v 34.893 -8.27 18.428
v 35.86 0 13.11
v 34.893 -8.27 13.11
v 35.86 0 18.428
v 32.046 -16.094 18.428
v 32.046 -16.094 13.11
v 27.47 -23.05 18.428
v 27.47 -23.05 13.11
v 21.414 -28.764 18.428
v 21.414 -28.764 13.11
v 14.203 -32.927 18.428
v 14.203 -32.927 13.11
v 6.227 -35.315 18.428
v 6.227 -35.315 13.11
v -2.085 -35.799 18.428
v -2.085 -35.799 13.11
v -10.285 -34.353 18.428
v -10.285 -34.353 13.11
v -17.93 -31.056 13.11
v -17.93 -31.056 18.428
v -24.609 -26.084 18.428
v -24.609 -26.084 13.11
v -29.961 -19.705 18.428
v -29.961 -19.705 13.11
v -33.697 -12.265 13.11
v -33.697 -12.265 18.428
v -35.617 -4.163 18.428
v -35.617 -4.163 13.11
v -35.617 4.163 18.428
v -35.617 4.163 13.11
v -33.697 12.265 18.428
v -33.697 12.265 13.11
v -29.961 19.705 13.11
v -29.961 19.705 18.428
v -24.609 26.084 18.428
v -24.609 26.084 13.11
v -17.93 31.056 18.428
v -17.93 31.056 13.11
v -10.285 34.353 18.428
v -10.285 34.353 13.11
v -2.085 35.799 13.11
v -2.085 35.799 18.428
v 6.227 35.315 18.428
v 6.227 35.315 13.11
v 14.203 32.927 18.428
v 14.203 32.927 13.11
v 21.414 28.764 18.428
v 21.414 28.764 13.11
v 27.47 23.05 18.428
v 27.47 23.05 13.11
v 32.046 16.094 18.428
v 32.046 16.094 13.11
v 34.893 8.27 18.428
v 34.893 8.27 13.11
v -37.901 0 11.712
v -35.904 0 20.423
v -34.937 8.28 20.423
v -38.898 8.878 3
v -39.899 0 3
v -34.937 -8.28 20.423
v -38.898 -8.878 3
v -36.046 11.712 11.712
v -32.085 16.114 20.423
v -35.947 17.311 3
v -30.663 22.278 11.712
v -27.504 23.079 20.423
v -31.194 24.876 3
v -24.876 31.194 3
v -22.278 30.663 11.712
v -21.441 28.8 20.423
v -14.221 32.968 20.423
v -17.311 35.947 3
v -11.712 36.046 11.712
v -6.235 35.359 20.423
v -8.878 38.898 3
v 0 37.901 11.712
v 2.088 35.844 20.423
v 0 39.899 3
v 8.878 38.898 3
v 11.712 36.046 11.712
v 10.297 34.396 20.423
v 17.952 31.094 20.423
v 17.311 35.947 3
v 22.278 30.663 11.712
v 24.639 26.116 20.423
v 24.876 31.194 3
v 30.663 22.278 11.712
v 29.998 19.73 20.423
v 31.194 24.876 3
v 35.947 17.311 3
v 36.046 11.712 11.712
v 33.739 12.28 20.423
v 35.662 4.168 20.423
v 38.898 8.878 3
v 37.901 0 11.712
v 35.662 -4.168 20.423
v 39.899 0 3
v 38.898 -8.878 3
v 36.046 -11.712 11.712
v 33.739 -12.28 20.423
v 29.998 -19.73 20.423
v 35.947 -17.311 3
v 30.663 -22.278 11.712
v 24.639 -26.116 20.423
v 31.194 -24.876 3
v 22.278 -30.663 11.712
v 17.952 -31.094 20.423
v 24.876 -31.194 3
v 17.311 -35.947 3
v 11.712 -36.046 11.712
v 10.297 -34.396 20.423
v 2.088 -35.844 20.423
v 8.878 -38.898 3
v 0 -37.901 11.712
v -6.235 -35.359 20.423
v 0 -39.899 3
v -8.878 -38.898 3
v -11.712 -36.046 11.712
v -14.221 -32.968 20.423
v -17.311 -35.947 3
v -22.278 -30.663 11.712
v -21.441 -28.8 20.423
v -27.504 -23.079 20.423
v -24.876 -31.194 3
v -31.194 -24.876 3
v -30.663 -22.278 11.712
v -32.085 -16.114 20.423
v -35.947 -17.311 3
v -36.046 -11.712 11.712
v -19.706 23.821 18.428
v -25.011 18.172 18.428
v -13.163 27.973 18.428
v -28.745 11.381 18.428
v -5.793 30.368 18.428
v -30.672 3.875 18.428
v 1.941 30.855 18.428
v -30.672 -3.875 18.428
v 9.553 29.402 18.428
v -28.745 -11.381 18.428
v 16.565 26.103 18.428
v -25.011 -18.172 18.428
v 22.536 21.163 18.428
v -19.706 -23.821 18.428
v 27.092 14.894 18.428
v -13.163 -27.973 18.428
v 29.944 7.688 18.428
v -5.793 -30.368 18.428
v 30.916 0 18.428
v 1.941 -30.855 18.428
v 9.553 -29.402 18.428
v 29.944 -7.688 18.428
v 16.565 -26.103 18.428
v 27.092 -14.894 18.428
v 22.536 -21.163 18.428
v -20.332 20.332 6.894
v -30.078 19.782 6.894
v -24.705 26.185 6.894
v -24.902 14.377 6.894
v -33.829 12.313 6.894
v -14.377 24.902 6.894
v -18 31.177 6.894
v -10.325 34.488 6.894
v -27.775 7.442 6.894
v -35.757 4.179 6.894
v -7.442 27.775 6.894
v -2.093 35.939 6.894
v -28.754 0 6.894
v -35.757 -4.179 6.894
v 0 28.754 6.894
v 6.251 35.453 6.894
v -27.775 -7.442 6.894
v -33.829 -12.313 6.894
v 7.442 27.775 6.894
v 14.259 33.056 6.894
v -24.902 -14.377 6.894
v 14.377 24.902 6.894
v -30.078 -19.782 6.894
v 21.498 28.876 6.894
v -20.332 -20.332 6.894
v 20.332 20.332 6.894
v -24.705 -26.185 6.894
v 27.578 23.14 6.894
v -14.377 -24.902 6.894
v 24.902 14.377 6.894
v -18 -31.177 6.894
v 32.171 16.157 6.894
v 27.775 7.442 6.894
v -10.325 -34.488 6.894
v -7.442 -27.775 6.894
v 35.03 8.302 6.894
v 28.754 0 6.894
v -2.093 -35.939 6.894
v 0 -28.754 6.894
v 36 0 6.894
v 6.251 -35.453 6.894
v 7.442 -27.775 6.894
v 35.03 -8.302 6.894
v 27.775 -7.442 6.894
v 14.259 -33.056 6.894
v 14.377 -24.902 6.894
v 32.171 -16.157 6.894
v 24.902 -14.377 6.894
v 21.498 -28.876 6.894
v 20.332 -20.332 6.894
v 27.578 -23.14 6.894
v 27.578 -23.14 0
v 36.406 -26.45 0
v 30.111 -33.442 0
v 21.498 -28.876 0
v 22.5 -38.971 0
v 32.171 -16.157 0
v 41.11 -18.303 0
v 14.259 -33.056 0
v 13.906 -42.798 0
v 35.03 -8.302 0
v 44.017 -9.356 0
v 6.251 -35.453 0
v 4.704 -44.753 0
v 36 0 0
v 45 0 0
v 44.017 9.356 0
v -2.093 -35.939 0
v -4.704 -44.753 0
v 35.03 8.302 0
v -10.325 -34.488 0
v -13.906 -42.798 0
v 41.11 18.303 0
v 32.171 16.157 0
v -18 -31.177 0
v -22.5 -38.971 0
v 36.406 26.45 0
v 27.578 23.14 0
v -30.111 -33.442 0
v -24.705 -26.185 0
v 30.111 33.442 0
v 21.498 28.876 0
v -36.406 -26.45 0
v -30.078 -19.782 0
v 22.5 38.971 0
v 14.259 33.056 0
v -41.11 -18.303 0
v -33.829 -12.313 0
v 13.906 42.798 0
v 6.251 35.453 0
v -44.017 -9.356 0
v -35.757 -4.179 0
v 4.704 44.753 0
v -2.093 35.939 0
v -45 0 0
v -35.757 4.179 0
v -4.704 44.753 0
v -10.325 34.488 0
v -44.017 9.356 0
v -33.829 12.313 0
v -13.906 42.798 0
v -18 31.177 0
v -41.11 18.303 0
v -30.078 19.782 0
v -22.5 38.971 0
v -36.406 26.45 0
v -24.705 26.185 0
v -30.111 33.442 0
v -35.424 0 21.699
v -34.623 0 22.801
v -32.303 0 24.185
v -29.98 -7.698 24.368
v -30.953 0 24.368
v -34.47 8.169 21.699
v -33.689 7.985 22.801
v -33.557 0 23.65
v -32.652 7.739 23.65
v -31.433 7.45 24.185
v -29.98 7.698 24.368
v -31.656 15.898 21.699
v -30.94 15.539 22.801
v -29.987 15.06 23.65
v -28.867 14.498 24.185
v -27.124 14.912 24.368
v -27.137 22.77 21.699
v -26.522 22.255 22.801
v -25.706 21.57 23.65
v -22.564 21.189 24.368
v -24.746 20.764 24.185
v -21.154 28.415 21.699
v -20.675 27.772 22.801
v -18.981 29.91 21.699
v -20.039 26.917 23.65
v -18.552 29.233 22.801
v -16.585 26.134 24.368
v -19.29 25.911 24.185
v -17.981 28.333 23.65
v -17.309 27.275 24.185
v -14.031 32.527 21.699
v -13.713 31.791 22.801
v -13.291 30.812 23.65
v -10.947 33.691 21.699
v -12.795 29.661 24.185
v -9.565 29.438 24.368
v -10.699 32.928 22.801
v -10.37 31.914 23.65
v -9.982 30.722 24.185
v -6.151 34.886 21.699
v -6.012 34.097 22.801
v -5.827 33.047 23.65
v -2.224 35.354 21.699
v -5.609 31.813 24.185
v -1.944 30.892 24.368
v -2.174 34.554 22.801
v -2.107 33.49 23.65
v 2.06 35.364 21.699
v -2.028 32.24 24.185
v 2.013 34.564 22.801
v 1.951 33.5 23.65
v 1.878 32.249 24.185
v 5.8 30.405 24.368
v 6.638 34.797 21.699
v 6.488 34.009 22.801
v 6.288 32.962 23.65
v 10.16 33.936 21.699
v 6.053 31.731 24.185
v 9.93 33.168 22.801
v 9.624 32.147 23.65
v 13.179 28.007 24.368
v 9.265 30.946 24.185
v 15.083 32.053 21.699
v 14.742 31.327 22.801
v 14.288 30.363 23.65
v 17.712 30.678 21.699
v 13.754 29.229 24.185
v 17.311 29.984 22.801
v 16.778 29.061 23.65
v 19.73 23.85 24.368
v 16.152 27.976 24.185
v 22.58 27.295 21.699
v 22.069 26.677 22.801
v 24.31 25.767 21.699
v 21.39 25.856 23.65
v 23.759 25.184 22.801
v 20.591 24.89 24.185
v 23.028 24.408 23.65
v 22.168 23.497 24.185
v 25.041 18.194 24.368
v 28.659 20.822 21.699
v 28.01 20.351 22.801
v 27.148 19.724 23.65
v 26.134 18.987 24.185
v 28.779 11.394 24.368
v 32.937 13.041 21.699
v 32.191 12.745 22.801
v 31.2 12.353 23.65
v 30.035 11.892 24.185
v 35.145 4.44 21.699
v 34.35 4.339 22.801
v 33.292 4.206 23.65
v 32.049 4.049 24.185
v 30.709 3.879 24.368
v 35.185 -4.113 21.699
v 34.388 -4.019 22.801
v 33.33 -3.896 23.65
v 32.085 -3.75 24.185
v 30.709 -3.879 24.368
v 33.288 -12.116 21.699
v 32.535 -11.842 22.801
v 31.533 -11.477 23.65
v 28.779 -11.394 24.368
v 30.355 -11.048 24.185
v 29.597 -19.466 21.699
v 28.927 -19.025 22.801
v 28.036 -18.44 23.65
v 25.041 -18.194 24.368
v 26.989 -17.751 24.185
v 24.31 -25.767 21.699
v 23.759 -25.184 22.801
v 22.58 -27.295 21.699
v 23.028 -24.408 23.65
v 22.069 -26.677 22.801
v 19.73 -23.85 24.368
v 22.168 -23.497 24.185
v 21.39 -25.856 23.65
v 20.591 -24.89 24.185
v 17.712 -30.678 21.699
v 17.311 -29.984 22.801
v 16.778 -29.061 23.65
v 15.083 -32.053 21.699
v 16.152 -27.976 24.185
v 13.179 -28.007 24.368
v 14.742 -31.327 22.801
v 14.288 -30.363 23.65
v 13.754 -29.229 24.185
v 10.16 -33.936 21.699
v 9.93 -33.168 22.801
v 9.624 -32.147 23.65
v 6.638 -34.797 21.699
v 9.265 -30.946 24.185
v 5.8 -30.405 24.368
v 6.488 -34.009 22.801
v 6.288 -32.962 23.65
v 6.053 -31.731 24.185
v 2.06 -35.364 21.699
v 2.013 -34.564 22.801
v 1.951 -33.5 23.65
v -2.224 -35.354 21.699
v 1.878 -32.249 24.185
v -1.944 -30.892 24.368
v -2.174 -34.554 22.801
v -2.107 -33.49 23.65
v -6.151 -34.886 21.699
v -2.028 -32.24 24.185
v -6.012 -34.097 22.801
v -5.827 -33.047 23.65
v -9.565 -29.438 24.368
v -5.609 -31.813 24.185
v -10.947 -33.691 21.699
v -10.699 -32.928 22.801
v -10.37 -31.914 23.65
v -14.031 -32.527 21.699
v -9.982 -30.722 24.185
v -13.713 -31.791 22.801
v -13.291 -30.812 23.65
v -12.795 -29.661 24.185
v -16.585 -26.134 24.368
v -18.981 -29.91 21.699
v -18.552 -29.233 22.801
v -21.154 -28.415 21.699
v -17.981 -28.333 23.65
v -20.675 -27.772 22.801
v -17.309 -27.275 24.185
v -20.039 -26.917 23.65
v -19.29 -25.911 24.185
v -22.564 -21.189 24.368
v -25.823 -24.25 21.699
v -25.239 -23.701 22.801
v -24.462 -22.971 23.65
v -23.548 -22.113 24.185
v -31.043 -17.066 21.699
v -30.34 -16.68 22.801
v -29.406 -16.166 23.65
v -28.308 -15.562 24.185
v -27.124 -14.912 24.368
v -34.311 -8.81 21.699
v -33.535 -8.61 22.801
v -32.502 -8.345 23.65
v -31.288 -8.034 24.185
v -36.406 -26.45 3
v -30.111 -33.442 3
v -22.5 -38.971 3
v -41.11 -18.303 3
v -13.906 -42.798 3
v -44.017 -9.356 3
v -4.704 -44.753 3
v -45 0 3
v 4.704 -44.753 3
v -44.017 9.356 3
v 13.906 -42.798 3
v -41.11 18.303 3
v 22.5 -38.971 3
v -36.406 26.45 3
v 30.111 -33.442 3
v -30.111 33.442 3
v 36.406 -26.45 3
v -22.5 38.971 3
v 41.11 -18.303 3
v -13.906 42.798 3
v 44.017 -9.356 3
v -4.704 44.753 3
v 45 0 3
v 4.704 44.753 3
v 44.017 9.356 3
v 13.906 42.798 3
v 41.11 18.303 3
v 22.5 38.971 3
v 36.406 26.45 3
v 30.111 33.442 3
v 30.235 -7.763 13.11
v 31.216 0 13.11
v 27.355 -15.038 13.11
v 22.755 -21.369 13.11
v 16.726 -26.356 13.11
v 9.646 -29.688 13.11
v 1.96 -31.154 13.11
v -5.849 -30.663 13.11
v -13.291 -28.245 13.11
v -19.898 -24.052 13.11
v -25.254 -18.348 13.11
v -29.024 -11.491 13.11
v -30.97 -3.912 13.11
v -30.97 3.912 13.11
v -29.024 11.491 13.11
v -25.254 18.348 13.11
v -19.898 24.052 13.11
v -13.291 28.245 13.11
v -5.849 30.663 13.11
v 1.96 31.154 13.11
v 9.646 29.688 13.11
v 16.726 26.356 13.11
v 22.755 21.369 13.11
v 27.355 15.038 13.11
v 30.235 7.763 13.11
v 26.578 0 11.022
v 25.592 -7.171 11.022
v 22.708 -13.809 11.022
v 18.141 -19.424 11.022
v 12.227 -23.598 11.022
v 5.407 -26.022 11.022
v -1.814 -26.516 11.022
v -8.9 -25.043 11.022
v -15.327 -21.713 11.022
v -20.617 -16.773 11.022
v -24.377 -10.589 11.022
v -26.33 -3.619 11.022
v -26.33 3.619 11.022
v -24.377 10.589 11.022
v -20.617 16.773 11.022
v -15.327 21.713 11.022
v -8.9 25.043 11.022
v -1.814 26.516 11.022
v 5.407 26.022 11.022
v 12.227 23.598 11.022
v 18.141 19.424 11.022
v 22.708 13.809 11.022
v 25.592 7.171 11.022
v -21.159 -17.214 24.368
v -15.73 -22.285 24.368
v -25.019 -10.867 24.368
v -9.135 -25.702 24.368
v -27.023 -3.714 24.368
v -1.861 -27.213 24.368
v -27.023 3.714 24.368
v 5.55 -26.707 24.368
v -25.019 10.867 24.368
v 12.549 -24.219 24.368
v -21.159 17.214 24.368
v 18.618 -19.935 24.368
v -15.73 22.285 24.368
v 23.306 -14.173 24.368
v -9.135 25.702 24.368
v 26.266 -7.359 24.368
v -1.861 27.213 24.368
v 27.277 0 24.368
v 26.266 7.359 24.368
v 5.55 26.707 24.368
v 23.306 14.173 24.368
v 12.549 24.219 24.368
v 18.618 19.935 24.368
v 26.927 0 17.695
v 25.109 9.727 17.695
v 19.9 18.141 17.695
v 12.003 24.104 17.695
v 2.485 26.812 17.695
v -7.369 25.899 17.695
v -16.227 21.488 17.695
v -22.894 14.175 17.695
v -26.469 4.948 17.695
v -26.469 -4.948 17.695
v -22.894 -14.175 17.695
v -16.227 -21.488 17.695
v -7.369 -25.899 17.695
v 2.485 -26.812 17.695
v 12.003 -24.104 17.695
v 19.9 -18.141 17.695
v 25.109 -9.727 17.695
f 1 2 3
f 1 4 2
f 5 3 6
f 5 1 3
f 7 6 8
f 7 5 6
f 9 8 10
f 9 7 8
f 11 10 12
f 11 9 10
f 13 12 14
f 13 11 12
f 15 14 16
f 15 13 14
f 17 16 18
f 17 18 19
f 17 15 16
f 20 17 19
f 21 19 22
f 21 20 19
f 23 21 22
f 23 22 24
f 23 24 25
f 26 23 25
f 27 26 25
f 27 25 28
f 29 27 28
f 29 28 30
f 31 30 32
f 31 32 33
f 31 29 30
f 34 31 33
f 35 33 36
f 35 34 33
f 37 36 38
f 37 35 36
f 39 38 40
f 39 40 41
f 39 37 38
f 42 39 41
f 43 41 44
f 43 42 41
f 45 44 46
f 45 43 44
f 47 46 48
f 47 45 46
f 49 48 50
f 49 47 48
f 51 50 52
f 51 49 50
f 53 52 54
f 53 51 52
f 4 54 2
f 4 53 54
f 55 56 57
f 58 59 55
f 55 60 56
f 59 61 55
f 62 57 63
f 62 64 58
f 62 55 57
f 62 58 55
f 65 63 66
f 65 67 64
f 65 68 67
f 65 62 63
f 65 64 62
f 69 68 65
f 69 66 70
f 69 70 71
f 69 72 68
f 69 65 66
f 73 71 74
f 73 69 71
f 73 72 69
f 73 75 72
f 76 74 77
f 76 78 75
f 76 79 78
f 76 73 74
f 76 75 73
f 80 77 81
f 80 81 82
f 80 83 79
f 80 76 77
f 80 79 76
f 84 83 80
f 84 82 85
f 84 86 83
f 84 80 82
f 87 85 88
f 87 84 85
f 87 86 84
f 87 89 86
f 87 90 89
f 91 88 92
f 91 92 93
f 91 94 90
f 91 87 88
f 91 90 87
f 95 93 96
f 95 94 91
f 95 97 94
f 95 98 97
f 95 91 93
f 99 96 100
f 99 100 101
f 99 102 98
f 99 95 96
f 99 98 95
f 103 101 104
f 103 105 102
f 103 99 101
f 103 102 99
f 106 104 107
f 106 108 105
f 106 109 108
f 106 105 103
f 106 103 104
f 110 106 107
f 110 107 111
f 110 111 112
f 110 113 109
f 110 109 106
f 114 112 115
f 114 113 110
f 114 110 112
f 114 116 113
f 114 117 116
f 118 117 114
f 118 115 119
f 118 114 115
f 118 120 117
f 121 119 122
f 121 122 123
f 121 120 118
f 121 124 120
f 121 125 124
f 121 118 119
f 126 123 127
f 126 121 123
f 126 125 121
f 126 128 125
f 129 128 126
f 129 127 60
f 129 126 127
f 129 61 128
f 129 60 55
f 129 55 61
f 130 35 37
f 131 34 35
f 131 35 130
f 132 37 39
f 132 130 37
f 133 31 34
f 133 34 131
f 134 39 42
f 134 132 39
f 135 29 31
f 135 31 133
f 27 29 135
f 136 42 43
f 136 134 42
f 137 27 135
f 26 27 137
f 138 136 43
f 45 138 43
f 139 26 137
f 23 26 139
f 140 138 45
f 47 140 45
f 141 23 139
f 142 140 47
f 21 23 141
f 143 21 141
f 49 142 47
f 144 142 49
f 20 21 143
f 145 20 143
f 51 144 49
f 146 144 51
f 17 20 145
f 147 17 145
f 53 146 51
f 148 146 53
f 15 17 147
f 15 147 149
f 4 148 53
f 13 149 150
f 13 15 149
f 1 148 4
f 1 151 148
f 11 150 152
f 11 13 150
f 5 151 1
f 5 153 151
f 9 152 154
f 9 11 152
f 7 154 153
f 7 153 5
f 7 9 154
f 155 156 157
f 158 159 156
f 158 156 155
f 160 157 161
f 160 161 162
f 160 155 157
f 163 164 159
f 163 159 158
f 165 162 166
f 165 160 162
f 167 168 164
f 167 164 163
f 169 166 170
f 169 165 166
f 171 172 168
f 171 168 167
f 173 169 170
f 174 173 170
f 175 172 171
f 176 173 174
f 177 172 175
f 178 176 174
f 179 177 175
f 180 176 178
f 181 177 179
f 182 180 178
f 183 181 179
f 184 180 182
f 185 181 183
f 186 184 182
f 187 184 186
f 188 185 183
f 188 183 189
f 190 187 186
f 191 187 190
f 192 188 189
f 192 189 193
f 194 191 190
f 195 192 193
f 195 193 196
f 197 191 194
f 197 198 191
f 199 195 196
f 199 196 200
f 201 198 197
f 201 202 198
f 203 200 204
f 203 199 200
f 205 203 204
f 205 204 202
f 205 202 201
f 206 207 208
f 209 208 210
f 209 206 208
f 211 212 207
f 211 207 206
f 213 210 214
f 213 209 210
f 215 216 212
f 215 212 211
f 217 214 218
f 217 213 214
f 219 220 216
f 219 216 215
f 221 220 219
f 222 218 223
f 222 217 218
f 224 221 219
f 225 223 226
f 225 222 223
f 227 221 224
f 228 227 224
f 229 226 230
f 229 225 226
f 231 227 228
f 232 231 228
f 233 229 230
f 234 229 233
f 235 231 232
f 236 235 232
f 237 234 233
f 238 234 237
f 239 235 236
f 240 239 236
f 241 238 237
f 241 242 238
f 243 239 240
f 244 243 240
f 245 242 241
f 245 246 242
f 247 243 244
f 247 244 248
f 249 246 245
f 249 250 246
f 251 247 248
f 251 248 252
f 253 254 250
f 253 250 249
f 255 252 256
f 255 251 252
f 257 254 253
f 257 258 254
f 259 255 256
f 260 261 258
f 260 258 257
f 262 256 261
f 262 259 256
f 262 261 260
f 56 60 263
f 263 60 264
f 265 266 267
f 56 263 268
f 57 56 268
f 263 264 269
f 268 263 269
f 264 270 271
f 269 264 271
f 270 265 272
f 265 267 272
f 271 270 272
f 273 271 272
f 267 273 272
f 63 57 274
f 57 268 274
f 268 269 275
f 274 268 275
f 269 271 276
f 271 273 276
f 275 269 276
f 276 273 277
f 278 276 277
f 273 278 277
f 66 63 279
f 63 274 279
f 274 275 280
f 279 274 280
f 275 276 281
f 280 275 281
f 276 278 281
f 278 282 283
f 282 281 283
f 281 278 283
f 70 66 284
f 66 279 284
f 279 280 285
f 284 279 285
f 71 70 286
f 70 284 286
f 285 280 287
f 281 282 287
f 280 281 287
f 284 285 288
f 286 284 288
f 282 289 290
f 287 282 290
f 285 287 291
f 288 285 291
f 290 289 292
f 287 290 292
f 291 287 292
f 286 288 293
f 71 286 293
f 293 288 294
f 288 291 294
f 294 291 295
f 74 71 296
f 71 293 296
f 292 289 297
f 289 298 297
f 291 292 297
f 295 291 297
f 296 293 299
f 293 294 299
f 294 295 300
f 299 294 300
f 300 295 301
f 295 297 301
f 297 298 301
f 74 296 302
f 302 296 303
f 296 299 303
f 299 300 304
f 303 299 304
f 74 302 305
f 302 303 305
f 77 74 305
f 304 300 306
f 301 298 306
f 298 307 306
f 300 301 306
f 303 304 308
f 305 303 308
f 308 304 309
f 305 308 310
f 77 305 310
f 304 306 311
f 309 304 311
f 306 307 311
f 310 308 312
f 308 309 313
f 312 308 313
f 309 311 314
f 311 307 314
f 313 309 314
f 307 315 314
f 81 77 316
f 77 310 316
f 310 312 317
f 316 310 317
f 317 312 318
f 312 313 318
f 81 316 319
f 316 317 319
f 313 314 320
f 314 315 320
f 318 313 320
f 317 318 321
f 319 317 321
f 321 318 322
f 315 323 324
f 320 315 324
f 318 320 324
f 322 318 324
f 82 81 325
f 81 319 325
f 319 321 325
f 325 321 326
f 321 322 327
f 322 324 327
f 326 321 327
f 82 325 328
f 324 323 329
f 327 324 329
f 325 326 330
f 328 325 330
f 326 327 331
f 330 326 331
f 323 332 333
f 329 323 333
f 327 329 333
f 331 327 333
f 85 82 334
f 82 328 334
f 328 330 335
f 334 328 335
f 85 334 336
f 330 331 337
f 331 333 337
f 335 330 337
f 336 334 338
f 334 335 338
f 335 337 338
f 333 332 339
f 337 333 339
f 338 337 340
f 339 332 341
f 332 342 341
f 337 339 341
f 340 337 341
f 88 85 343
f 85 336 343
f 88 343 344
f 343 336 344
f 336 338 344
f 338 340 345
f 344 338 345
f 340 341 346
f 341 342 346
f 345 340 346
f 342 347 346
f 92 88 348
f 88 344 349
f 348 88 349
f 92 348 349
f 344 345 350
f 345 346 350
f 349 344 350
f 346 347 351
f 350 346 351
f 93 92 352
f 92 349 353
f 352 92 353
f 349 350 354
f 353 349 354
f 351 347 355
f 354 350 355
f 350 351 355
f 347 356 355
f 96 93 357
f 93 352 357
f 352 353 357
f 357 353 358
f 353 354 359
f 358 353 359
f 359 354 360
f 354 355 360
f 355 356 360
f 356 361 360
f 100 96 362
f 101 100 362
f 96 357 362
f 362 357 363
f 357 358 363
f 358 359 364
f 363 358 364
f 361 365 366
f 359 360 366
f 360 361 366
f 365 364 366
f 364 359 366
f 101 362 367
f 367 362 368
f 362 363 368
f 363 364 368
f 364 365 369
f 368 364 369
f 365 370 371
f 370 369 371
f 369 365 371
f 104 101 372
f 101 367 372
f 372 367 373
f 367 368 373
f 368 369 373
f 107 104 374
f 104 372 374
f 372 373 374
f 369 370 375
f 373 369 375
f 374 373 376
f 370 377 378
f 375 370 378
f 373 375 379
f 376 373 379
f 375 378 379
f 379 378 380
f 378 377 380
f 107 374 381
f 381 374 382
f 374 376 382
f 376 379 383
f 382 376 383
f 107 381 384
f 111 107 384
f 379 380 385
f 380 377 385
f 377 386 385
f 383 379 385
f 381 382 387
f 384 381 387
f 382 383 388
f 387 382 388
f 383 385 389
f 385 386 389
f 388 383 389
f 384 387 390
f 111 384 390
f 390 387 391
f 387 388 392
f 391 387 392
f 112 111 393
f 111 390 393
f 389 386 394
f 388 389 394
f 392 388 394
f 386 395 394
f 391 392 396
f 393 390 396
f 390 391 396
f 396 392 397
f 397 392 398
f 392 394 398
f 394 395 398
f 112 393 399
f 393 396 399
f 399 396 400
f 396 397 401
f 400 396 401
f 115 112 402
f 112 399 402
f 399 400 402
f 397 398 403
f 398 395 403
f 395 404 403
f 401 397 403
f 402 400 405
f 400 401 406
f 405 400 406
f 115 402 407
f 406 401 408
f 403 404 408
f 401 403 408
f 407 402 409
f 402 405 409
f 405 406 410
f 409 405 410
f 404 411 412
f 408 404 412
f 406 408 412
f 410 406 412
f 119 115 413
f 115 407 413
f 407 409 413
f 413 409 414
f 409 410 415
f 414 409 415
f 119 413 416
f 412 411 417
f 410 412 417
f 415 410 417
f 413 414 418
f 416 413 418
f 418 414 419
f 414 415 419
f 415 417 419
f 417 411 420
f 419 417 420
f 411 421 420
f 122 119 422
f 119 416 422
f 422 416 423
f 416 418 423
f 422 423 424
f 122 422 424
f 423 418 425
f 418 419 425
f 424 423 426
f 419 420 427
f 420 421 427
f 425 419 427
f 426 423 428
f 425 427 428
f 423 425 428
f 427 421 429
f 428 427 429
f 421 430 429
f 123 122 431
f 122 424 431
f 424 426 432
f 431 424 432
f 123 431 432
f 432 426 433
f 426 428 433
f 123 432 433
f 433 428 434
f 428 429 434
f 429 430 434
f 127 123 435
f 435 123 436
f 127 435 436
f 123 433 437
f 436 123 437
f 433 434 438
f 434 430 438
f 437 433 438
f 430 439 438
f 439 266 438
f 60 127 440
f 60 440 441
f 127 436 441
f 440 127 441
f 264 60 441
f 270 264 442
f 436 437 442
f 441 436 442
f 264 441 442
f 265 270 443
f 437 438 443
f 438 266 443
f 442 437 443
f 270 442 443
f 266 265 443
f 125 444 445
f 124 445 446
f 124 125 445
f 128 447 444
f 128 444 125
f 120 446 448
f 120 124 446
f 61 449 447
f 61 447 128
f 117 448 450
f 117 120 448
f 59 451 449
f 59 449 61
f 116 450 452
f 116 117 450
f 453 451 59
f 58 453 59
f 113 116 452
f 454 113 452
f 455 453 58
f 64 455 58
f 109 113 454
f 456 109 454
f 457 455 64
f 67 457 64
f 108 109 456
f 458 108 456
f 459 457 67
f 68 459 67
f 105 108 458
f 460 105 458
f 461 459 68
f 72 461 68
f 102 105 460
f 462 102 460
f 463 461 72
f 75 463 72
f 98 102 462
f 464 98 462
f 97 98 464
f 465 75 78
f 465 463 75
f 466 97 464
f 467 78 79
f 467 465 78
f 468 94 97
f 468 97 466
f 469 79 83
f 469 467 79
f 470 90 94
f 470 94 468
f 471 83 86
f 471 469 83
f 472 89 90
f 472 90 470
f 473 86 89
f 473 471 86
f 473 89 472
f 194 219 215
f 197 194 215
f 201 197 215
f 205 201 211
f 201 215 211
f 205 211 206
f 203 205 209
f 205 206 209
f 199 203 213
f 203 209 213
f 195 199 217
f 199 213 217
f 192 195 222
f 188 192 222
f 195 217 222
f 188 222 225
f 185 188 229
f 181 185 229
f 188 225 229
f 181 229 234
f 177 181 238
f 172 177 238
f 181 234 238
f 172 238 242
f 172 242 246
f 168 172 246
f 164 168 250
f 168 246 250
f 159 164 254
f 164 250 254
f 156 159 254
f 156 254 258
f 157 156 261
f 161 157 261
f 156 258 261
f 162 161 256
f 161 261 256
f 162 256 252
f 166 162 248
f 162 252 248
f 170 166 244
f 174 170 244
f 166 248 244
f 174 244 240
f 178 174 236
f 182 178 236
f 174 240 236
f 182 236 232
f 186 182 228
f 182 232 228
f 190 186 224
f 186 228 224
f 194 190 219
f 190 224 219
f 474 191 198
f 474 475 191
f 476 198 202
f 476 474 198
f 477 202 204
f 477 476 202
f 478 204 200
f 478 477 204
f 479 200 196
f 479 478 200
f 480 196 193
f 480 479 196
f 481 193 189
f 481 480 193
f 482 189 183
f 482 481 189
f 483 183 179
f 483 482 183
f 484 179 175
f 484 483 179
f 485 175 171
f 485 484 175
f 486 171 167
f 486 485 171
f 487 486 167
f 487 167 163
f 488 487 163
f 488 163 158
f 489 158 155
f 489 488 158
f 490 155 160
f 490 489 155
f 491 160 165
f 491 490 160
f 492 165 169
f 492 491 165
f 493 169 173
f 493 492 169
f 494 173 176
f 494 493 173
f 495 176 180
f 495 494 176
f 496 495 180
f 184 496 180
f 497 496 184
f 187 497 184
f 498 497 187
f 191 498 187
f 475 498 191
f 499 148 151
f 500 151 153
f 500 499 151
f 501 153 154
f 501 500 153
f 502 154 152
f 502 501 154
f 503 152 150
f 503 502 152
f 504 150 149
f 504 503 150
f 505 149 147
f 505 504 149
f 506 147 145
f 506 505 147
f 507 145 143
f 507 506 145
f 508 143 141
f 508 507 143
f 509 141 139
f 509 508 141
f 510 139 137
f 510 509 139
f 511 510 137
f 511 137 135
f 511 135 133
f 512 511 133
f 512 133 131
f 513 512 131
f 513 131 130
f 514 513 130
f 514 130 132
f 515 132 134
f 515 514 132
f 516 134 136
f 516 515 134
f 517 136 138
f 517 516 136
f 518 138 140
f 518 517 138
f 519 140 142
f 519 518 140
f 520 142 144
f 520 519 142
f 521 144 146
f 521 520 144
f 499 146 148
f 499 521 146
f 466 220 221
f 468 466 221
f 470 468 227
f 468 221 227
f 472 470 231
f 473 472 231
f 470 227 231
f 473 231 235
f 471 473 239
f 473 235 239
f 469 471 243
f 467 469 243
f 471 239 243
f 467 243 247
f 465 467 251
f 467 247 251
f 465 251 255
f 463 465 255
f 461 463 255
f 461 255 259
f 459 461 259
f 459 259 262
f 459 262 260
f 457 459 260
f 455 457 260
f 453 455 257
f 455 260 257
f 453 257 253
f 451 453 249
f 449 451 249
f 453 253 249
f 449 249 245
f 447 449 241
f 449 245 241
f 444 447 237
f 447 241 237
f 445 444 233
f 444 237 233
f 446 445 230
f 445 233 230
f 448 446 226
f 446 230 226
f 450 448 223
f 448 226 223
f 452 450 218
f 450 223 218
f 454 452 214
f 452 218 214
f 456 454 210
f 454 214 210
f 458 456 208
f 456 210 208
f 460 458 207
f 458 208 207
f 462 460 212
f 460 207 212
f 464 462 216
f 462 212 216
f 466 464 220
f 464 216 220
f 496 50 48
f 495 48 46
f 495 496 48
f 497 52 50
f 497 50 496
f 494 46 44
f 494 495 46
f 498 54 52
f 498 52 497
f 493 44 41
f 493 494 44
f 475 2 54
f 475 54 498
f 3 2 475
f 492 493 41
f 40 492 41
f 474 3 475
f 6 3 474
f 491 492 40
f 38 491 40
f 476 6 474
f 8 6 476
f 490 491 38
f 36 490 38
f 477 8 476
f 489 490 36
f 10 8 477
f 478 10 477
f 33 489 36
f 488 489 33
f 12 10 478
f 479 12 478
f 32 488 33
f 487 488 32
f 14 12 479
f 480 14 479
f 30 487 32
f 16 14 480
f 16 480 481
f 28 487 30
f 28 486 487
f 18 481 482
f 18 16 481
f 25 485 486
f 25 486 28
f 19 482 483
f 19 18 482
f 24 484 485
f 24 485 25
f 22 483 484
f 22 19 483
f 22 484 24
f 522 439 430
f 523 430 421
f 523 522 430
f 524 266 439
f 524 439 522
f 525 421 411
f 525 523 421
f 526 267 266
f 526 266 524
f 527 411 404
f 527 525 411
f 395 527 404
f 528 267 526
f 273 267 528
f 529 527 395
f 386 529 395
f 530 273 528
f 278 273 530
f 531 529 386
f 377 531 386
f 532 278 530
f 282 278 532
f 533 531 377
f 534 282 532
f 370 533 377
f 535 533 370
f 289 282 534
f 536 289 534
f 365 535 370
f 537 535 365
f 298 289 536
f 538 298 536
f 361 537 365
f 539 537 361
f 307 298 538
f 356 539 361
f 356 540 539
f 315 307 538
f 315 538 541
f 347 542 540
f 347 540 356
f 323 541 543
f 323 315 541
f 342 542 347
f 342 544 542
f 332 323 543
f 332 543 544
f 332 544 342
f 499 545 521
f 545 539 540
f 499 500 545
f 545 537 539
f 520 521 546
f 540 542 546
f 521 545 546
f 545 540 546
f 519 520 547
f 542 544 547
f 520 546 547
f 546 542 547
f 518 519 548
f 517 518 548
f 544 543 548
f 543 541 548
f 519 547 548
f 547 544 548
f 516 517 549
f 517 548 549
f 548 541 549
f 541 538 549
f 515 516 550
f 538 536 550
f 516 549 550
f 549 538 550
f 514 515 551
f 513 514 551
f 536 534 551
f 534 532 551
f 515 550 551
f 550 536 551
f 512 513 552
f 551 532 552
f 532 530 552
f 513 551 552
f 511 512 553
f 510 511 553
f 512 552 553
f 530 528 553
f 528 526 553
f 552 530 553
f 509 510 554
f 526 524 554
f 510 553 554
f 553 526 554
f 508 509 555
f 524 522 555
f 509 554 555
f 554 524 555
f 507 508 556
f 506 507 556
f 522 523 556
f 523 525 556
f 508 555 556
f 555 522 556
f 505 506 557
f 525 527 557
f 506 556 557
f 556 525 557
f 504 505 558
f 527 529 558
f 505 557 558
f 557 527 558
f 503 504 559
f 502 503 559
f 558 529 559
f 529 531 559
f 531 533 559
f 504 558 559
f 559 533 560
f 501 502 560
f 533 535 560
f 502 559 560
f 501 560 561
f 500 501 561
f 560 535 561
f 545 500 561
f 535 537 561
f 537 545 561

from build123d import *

# Parameters (mm, degrees)
F0_R      = 45
F1_DEPTH  = 3
F4_R      = 5.08
F5_R      = 26
F6_DEPTH  = 37.8739
F6_TAPER  = -3
F9_R      = 36
F10_DEPTH = 6.894


with BuildPart() as f1:
    # F0 (on Top) → F1 (new body)
    with BuildSketch(Plane.XY):
        Circle(F0_R)
    extrude(amount=F1_DEPTH)

    # F2 (on Front) → F3 (revolve)
    with BuildSketch(Plane.XZ):
        Polygon((-40.5863100491, 0), (0, 0), (0, 24.3678710608), (-35, 24.3678710608), align=None)
    revolve(axis=Axis((0, 0, -19.3198865833), (0, 0, -1)))

    # F4
    f4_edges = [f1.edges().sort_by_distance(p)[0] for p in [
        (35, 0, 24.367871),
    ]]
    fillet(f4_edges, radius=F4_R)

    # F5 (on Top) → F6 (cut, symmetric)
    with BuildSketch(Plane.XY):
        Circle(F5_R)
    extrude(amount=F6_DEPTH, both=True, taper=F6_TAPER, mode=Mode.SUBTRACT)

    # F7 (on Front) → F8 (revolve, cut)
    with BuildSketch(Plane.XZ):
        Polygon((35.8599051833, 18.4277258813), (30.9155862778, 18.4277258813), (20.1216544956, 0), (26.0245222598, 0), (31.2158084296, 13.110072352), (35.8599051833, 13.110072352), align=None)
    revolve(axis=Axis((0, 0, 14.1704455018), (0, 0, -1)), mode=Mode.SUBTRACT)

    # F9 (on face) → F10 (cut)
    with BuildSketch(Plane(origin=(0, 0, 0), x_dir=(1, 0, 0), z_dir=(0, 0, -1))):
        Circle(F9_R)
    extrude(amount=-F10_DEPTH, mode=Mode.SUBTRACT)


solid = f1.part
